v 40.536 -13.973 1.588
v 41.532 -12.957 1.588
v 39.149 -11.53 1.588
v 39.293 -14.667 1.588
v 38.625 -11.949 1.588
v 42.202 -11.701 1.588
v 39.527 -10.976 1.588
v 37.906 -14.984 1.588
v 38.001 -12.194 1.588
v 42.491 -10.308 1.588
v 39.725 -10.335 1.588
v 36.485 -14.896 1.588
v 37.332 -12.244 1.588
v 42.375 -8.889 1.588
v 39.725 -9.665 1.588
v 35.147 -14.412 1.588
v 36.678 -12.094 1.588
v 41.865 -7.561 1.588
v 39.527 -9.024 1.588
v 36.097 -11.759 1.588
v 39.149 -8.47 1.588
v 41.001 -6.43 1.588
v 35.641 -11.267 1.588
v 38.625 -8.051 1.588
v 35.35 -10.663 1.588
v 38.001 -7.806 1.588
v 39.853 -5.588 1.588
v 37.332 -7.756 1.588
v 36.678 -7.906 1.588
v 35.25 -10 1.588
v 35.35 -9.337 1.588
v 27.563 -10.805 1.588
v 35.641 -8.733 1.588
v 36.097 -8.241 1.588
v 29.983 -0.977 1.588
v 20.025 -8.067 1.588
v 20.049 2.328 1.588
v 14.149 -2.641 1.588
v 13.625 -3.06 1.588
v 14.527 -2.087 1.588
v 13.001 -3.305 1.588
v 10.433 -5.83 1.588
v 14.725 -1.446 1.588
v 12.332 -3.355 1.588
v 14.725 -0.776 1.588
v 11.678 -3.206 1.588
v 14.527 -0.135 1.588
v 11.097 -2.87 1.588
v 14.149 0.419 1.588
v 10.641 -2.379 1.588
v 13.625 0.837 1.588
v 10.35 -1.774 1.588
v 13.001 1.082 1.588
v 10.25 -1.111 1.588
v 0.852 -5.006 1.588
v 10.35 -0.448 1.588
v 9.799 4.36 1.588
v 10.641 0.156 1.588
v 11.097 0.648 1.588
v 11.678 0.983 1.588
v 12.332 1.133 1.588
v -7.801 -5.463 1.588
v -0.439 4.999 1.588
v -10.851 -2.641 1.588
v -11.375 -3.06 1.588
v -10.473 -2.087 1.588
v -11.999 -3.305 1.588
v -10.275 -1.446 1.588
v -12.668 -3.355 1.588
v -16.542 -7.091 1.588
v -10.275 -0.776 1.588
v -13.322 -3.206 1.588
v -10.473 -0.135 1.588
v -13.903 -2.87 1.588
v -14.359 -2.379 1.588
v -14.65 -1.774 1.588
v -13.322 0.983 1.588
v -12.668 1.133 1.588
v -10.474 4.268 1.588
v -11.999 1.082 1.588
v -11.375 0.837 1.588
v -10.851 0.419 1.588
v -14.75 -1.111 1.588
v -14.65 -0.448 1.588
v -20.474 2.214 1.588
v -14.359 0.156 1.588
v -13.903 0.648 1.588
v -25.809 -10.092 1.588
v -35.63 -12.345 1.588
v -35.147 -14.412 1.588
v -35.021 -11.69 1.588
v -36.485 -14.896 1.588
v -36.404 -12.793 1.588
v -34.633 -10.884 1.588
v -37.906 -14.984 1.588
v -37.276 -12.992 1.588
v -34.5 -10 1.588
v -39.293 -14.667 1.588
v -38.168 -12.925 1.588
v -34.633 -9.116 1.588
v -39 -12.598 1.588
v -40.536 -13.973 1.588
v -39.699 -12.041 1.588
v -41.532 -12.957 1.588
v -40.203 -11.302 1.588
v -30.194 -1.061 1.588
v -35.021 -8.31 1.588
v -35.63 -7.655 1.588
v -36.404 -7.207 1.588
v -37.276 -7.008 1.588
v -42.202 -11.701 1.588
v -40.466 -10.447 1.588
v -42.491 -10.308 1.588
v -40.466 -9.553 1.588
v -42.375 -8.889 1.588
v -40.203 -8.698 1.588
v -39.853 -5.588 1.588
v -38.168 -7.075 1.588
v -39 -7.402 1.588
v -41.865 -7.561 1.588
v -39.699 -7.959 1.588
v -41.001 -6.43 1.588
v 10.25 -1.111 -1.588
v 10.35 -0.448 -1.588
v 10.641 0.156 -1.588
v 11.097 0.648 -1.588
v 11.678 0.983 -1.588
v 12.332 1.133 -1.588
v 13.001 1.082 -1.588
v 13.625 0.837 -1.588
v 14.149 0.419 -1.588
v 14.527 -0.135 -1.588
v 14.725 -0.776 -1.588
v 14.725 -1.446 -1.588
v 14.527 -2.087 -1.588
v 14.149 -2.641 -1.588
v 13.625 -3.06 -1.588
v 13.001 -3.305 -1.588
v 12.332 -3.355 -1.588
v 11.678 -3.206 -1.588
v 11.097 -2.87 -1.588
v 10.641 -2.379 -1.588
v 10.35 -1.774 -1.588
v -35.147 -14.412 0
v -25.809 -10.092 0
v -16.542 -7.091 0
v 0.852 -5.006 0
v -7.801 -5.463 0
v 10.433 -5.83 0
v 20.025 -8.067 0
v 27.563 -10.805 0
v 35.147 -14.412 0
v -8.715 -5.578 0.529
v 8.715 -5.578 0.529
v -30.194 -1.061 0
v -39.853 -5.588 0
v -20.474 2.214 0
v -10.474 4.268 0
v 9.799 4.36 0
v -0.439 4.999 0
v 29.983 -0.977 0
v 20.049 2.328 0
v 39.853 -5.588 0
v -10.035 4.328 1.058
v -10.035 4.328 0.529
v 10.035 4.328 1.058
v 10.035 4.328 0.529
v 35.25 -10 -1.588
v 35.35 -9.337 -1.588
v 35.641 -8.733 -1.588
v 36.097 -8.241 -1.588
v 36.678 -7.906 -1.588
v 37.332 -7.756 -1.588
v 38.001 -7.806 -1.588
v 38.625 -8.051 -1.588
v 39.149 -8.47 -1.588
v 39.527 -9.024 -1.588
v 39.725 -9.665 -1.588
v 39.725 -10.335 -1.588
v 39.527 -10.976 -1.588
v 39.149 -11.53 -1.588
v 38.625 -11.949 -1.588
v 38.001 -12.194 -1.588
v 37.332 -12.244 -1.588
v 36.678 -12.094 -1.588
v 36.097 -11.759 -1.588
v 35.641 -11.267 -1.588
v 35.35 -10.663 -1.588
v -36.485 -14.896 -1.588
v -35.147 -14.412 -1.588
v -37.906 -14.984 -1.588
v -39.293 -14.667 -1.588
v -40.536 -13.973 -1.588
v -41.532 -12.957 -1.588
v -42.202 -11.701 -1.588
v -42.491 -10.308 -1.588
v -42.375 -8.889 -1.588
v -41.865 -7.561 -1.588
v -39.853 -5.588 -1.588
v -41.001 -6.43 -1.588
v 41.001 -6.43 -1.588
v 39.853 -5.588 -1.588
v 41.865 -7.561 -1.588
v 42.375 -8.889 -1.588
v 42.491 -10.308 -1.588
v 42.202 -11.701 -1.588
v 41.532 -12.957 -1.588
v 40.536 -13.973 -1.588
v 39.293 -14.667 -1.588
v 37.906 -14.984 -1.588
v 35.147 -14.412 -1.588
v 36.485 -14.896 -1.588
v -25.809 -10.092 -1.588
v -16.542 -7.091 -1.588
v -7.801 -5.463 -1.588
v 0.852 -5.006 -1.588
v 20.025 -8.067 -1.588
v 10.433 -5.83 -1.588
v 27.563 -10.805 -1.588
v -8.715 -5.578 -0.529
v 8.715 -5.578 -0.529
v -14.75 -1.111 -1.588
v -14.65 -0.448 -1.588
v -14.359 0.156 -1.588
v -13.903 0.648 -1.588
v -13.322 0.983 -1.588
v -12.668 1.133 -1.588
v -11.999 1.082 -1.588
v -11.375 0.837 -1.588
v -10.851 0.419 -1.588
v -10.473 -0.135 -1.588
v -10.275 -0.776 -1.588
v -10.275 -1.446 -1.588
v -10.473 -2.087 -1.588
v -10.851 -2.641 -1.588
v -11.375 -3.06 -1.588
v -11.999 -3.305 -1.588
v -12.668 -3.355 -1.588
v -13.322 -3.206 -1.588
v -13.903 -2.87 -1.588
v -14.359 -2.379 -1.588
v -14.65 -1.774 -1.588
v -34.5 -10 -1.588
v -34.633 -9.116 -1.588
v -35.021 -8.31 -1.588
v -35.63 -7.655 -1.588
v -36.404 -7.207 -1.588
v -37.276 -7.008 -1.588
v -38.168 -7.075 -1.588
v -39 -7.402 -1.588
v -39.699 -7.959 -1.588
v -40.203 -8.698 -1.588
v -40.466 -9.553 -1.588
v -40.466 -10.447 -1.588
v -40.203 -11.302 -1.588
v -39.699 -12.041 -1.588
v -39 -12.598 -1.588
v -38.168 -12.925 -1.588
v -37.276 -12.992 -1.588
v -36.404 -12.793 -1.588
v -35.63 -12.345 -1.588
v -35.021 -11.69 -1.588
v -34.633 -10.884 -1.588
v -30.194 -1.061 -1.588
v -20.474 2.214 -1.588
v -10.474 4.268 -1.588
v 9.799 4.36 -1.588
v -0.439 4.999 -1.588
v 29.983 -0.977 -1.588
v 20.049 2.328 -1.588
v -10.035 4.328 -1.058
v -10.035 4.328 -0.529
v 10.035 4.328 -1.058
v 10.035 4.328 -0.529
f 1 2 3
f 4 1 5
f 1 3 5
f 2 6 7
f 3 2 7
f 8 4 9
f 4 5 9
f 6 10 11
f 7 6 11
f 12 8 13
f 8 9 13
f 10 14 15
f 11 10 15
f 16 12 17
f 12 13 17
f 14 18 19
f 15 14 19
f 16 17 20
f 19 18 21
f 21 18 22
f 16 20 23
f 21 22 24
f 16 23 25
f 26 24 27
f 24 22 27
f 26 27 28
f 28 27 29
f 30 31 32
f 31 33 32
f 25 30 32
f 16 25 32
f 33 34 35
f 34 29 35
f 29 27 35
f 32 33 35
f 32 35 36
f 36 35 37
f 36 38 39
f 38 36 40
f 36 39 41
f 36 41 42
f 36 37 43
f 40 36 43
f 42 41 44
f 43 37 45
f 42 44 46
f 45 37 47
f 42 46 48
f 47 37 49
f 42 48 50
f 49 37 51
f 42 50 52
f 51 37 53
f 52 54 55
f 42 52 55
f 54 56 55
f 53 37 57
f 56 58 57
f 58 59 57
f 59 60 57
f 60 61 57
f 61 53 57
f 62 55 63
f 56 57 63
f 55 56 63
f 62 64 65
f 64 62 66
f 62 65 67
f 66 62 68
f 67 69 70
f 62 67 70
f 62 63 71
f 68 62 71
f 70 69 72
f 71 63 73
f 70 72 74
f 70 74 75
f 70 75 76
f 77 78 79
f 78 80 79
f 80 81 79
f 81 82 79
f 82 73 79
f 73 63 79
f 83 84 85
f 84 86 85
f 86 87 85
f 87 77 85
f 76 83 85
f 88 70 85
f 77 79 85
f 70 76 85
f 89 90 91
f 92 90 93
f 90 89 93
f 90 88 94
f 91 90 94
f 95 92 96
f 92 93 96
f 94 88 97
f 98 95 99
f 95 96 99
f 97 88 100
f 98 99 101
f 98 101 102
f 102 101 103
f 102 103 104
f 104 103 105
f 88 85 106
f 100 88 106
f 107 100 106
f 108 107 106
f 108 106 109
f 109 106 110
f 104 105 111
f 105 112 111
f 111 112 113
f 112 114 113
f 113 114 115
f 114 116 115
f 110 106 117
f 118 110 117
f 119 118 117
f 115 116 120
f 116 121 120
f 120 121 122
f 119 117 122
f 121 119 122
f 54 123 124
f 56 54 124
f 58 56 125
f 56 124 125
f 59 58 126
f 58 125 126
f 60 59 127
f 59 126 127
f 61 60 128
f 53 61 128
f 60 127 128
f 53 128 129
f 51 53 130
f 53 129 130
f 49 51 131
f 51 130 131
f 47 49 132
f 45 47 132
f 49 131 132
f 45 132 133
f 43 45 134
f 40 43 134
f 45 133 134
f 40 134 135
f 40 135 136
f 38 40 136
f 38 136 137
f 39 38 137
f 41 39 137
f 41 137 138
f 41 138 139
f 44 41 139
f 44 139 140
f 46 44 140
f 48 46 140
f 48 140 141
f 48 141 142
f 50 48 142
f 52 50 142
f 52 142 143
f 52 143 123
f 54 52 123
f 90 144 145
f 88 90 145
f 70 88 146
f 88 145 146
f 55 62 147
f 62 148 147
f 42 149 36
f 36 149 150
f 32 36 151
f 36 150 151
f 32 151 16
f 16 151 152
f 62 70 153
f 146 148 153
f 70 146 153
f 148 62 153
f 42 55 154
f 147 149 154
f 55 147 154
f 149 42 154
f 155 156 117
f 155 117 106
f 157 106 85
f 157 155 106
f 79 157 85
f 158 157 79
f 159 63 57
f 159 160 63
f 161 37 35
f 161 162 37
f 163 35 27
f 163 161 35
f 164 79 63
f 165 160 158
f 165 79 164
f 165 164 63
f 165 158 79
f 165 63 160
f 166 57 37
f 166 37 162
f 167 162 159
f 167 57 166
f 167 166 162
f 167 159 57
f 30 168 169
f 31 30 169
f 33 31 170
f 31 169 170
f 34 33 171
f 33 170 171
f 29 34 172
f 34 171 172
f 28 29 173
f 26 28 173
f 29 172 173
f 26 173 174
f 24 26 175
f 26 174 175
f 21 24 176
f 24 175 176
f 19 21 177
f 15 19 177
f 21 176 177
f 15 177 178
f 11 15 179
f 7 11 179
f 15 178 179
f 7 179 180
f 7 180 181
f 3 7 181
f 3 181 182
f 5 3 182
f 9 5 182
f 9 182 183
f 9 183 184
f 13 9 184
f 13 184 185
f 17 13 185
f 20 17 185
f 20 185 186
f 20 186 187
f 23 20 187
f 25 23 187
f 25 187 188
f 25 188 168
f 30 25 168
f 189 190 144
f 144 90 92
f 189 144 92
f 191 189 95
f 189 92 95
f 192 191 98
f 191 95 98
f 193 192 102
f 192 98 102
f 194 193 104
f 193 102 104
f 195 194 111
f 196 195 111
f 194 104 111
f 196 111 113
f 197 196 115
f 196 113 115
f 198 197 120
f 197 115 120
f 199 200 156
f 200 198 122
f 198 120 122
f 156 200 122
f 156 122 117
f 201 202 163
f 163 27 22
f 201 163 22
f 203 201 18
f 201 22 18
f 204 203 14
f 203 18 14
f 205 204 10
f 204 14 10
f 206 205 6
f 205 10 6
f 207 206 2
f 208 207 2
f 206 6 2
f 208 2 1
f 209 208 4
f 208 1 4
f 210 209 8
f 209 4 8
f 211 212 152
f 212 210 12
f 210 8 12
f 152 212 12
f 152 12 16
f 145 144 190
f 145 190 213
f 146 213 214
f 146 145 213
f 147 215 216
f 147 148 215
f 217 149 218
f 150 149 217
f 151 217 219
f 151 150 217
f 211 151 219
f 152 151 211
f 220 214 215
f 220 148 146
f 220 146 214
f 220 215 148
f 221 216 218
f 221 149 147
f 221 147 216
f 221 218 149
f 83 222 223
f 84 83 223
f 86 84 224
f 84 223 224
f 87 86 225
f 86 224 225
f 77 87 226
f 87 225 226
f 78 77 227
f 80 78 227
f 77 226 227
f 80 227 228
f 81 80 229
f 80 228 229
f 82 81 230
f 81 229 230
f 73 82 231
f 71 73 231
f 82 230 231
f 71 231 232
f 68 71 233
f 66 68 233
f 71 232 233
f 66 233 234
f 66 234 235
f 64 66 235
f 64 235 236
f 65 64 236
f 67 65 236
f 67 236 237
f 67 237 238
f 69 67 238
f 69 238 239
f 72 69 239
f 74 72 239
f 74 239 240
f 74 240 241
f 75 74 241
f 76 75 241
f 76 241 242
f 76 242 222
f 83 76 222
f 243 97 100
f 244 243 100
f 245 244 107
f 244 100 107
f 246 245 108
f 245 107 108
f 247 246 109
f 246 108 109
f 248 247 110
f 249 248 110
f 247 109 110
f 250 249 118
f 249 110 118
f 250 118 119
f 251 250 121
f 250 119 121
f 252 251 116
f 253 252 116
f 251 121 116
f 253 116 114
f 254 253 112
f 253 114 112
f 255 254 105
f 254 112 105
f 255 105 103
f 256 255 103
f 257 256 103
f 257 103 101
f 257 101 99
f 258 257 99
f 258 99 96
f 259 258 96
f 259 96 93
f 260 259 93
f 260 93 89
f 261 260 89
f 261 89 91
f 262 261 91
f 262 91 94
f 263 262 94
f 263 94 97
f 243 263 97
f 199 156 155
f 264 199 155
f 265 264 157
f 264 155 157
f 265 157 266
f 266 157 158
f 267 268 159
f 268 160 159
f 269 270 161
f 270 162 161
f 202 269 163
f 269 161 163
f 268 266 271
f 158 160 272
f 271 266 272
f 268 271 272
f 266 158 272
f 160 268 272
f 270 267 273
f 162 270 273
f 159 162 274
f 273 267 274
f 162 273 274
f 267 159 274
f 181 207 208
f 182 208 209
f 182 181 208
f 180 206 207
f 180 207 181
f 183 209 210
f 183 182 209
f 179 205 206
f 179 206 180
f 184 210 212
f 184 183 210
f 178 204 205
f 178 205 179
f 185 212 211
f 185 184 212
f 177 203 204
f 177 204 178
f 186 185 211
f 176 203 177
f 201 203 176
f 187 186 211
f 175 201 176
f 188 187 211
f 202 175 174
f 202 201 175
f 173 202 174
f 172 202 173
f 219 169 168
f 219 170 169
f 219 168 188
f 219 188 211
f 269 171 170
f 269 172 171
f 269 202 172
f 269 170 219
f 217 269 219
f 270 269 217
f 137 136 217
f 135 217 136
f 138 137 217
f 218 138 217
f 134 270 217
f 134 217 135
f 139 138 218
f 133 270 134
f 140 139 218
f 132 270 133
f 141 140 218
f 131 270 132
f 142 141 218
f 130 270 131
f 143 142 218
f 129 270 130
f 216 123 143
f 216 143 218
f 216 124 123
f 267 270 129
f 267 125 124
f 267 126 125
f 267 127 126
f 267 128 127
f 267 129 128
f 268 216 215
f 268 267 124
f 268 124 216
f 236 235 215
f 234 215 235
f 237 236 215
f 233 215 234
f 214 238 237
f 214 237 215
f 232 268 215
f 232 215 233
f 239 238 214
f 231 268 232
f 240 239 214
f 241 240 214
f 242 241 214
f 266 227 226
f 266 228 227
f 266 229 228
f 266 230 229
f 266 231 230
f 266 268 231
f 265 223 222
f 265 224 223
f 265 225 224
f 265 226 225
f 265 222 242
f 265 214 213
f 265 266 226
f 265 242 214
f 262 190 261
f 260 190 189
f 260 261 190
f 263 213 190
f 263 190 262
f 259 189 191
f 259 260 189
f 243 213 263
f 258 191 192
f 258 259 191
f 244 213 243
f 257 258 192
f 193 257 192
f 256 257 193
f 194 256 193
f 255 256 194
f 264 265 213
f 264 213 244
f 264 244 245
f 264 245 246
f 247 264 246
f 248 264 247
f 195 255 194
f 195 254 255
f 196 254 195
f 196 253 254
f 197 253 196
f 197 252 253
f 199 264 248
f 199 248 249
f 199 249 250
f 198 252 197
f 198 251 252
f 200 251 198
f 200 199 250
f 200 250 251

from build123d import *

# Parameters (mm, degrees)
BOSS_EXTRUDE1_DEPTH  = 1.5875
M4_CLEARANCE_HOLE1_D = 4.5
SKETCH5_R            = 3
CUT_EXTRUDE1_DEPTH   = 4.1750001


with BuildPart() as part:
    # Sketch1 → Boss-Extrude1 (new body, symmetric)
    with BuildSketch(Plane.XY):
        with BuildLine():
            ThreePointArc((-35.147058824, -14.411764706), (-41.911764706, -12.352941176), (-39.852941176, -5.588235294))
            add(Edge.make_bspline(
                [(-39.852941176, -5.588235294), (-25.087835375, 2.313761515), (0, 5.671559621), (25.087835375, 2.313761515), (39.852941176, -5.588235294)],
                knots=[0, 0, 0, 0.375, 0.625, 1, 1, 1], degree=2))
            ThreePointArc((39.852941176, -5.588235294), (41.911764706, -12.352941176), (35.147058824, -14.411764706))
            add(Edge.make_bspline(
                [(-35.147058824, -14.411764706), (-21.787164625, -7.313761515), (0, -4.421559621), (21.787164625, -7.313761515), (35.147058824, -14.411764706)],
                knots=[0, 0, 0, 0.375, 0.625, 1, 1, 1], degree=2))
        make_face()
    extrude(amount=BOSS_EXTRUDE1_DEPTH, both=True)

    # M4 Clearance Hole1 (through all)
    with Locations(Plane.XY.offset(1.5875)):
        with Locations((37.5, -10), (-12.5, -1.111111111), (12.5, -1.111111111)):
            Hole(M4_CLEARANCE_HOLE1_D / 2)

    # Sketch5 → Cut-Extrude1 (cut, through all)
    with BuildSketch(Plane.XY.offset(1.5875)):
        with Locations((-37.5, -10)):
            Circle(SKETCH5_R)
    extrude(amount=-CUT_EXTRUDE1_DEPTH, mode=Mode.SUBTRACT)


solid = part.part
